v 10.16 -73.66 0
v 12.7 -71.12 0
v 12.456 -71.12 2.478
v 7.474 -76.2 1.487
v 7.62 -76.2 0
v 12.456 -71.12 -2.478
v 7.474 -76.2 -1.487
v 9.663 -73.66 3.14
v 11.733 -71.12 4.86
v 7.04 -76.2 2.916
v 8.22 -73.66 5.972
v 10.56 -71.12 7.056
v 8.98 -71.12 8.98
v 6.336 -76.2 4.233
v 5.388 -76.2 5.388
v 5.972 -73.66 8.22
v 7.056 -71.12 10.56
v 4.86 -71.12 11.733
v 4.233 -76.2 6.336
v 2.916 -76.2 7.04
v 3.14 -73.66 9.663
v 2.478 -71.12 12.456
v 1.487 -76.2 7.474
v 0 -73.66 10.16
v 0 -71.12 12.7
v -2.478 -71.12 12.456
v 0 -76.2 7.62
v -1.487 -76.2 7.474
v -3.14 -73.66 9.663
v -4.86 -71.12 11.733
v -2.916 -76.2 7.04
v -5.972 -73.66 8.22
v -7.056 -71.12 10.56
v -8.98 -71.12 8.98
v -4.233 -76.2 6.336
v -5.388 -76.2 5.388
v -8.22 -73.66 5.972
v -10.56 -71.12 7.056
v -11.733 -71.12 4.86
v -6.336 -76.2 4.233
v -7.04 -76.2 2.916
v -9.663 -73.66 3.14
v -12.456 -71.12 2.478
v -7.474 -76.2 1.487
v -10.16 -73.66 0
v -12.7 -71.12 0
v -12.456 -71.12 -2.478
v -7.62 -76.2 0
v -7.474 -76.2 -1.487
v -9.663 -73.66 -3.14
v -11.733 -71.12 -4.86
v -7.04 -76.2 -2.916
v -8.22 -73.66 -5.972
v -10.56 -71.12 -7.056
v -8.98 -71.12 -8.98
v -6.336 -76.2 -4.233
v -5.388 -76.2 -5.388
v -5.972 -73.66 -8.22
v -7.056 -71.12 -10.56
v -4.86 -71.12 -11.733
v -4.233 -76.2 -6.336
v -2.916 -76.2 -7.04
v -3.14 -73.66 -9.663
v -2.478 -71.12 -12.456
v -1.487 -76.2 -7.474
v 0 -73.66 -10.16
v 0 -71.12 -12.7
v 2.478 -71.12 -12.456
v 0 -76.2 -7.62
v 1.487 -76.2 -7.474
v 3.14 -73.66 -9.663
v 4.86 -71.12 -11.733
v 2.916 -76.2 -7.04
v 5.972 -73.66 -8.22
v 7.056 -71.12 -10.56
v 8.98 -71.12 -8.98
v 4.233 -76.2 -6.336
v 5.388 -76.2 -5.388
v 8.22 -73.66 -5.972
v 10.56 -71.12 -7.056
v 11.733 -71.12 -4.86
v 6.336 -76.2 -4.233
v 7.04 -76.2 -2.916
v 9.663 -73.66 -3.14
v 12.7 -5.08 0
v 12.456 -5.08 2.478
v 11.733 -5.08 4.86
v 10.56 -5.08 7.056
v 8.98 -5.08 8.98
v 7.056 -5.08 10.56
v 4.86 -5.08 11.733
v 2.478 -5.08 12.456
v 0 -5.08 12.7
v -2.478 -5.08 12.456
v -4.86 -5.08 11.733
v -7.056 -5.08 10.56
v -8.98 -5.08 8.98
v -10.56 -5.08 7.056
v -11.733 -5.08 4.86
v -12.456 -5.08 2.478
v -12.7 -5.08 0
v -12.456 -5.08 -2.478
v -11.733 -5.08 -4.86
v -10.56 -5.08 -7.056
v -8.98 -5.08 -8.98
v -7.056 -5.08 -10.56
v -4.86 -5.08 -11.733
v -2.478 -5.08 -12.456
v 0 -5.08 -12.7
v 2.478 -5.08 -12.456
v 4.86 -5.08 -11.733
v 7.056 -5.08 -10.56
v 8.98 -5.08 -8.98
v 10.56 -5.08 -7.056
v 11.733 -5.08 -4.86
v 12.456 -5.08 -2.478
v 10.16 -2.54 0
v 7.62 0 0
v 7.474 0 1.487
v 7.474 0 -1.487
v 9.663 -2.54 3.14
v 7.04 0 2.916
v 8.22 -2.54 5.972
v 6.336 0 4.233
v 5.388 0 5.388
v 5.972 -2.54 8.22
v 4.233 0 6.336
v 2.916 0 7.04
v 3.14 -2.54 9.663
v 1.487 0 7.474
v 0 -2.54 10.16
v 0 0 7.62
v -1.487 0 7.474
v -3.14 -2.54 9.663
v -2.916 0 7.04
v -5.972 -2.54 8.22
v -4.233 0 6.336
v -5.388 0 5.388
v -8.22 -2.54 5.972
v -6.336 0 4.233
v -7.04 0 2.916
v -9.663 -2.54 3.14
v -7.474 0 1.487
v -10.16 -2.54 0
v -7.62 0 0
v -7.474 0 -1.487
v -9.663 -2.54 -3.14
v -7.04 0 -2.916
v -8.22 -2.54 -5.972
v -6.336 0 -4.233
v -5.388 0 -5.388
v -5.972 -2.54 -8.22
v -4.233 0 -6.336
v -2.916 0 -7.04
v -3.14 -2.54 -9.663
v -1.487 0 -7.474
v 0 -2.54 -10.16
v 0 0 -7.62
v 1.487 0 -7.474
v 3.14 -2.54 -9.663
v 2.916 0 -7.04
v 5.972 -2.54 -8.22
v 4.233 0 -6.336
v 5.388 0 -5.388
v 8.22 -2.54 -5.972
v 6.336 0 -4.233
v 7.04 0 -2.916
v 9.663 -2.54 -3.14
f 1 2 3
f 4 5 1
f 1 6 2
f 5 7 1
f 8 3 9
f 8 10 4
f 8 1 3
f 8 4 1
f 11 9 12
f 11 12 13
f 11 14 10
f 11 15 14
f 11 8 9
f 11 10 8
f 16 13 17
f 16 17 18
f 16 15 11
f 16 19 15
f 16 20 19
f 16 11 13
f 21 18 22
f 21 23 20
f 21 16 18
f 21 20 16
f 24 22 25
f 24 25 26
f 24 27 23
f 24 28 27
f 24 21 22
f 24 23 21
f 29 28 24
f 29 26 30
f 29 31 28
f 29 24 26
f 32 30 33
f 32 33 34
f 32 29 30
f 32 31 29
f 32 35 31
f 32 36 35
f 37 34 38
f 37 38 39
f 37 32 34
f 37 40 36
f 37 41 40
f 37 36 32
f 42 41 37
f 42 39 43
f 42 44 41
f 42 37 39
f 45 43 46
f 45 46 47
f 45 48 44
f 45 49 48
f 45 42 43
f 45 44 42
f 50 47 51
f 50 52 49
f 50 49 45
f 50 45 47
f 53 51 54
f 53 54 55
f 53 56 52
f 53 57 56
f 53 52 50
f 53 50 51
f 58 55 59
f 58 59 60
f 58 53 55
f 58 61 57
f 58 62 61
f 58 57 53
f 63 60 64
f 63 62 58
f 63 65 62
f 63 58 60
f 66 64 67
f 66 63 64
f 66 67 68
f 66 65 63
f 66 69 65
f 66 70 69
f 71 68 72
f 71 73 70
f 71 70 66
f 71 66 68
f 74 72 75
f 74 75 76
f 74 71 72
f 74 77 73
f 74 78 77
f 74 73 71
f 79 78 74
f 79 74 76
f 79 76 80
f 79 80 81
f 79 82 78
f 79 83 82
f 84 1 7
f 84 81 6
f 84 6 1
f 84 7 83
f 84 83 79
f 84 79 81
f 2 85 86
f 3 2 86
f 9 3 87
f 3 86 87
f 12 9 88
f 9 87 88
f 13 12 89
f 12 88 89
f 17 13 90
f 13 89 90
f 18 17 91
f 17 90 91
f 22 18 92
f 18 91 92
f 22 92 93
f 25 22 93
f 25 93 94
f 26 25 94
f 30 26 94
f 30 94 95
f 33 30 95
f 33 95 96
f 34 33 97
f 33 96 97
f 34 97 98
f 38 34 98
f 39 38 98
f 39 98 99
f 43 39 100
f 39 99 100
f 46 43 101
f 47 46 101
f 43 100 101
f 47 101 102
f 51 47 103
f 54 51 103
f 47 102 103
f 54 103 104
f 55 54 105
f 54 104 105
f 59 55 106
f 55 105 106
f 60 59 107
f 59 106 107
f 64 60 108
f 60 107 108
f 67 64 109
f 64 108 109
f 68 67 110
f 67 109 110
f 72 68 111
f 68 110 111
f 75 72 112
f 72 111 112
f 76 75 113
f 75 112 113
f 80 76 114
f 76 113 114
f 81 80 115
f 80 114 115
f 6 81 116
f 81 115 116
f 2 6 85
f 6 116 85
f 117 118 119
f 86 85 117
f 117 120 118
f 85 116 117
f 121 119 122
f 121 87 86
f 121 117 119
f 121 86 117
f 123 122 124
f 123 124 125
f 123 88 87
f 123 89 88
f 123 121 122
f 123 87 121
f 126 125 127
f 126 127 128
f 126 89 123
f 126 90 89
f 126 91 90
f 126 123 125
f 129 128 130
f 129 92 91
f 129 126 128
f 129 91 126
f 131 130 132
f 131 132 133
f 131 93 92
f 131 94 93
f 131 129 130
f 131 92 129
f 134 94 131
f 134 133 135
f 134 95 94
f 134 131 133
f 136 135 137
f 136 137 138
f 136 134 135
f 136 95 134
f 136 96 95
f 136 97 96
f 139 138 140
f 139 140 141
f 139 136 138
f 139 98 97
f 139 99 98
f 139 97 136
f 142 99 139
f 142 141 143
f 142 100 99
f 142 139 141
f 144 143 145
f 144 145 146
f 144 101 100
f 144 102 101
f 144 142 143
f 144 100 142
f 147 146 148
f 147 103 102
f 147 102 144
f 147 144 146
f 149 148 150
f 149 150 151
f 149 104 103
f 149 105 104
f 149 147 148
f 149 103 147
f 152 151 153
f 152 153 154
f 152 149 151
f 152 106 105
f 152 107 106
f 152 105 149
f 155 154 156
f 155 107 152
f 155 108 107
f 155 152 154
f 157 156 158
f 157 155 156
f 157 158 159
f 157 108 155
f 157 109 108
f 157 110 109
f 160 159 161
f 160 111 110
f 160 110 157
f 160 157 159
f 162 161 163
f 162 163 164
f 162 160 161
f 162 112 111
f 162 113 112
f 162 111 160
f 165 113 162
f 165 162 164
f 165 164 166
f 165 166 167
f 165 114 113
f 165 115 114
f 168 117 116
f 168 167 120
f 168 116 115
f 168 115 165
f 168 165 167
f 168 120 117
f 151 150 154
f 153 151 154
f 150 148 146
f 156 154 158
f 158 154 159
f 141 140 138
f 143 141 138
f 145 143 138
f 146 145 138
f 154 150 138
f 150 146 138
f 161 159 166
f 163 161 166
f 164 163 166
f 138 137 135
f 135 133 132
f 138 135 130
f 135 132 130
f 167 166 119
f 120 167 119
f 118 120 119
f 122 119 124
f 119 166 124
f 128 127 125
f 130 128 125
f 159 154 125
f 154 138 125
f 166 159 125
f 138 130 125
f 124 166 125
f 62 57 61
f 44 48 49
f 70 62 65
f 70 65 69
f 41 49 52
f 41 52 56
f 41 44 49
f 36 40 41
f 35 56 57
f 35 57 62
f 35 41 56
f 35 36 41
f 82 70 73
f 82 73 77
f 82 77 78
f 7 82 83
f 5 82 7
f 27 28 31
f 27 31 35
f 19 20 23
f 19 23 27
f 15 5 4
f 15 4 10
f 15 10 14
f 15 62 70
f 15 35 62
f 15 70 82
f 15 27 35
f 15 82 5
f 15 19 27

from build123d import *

# Parameters (mm, degrees)
F0_R     = 12.7
F0_R_2   = 5.08
F1_DEPTH = 76.2
F2_DEPTH = 76.2
F3_SIZE  = 5.08


with BuildPart() as f1:
    # F0 (on Front) → F1 (new body)
    with BuildSketch(Plane.XZ):
        Circle(F0_R)
        Circle(F0_R_2, mode=Mode.SUBTRACT)
    extrude(amount=F1_DEPTH)

    # F0 (on Front) → F2 (join)
    with BuildSketch(Plane.XZ):
        Circle(F0_R_2)
    extrude(amount=F2_DEPTH)

    # F3
    f3_edges = [f1.edges().sort_by_distance(p)[0] for p in [
        (-12.7, -76.2, 0),
        (-12.7, 0, 0),
    ]]
    chamfer(f3_edges, length=F3_SIZE)


solid = f1.part
